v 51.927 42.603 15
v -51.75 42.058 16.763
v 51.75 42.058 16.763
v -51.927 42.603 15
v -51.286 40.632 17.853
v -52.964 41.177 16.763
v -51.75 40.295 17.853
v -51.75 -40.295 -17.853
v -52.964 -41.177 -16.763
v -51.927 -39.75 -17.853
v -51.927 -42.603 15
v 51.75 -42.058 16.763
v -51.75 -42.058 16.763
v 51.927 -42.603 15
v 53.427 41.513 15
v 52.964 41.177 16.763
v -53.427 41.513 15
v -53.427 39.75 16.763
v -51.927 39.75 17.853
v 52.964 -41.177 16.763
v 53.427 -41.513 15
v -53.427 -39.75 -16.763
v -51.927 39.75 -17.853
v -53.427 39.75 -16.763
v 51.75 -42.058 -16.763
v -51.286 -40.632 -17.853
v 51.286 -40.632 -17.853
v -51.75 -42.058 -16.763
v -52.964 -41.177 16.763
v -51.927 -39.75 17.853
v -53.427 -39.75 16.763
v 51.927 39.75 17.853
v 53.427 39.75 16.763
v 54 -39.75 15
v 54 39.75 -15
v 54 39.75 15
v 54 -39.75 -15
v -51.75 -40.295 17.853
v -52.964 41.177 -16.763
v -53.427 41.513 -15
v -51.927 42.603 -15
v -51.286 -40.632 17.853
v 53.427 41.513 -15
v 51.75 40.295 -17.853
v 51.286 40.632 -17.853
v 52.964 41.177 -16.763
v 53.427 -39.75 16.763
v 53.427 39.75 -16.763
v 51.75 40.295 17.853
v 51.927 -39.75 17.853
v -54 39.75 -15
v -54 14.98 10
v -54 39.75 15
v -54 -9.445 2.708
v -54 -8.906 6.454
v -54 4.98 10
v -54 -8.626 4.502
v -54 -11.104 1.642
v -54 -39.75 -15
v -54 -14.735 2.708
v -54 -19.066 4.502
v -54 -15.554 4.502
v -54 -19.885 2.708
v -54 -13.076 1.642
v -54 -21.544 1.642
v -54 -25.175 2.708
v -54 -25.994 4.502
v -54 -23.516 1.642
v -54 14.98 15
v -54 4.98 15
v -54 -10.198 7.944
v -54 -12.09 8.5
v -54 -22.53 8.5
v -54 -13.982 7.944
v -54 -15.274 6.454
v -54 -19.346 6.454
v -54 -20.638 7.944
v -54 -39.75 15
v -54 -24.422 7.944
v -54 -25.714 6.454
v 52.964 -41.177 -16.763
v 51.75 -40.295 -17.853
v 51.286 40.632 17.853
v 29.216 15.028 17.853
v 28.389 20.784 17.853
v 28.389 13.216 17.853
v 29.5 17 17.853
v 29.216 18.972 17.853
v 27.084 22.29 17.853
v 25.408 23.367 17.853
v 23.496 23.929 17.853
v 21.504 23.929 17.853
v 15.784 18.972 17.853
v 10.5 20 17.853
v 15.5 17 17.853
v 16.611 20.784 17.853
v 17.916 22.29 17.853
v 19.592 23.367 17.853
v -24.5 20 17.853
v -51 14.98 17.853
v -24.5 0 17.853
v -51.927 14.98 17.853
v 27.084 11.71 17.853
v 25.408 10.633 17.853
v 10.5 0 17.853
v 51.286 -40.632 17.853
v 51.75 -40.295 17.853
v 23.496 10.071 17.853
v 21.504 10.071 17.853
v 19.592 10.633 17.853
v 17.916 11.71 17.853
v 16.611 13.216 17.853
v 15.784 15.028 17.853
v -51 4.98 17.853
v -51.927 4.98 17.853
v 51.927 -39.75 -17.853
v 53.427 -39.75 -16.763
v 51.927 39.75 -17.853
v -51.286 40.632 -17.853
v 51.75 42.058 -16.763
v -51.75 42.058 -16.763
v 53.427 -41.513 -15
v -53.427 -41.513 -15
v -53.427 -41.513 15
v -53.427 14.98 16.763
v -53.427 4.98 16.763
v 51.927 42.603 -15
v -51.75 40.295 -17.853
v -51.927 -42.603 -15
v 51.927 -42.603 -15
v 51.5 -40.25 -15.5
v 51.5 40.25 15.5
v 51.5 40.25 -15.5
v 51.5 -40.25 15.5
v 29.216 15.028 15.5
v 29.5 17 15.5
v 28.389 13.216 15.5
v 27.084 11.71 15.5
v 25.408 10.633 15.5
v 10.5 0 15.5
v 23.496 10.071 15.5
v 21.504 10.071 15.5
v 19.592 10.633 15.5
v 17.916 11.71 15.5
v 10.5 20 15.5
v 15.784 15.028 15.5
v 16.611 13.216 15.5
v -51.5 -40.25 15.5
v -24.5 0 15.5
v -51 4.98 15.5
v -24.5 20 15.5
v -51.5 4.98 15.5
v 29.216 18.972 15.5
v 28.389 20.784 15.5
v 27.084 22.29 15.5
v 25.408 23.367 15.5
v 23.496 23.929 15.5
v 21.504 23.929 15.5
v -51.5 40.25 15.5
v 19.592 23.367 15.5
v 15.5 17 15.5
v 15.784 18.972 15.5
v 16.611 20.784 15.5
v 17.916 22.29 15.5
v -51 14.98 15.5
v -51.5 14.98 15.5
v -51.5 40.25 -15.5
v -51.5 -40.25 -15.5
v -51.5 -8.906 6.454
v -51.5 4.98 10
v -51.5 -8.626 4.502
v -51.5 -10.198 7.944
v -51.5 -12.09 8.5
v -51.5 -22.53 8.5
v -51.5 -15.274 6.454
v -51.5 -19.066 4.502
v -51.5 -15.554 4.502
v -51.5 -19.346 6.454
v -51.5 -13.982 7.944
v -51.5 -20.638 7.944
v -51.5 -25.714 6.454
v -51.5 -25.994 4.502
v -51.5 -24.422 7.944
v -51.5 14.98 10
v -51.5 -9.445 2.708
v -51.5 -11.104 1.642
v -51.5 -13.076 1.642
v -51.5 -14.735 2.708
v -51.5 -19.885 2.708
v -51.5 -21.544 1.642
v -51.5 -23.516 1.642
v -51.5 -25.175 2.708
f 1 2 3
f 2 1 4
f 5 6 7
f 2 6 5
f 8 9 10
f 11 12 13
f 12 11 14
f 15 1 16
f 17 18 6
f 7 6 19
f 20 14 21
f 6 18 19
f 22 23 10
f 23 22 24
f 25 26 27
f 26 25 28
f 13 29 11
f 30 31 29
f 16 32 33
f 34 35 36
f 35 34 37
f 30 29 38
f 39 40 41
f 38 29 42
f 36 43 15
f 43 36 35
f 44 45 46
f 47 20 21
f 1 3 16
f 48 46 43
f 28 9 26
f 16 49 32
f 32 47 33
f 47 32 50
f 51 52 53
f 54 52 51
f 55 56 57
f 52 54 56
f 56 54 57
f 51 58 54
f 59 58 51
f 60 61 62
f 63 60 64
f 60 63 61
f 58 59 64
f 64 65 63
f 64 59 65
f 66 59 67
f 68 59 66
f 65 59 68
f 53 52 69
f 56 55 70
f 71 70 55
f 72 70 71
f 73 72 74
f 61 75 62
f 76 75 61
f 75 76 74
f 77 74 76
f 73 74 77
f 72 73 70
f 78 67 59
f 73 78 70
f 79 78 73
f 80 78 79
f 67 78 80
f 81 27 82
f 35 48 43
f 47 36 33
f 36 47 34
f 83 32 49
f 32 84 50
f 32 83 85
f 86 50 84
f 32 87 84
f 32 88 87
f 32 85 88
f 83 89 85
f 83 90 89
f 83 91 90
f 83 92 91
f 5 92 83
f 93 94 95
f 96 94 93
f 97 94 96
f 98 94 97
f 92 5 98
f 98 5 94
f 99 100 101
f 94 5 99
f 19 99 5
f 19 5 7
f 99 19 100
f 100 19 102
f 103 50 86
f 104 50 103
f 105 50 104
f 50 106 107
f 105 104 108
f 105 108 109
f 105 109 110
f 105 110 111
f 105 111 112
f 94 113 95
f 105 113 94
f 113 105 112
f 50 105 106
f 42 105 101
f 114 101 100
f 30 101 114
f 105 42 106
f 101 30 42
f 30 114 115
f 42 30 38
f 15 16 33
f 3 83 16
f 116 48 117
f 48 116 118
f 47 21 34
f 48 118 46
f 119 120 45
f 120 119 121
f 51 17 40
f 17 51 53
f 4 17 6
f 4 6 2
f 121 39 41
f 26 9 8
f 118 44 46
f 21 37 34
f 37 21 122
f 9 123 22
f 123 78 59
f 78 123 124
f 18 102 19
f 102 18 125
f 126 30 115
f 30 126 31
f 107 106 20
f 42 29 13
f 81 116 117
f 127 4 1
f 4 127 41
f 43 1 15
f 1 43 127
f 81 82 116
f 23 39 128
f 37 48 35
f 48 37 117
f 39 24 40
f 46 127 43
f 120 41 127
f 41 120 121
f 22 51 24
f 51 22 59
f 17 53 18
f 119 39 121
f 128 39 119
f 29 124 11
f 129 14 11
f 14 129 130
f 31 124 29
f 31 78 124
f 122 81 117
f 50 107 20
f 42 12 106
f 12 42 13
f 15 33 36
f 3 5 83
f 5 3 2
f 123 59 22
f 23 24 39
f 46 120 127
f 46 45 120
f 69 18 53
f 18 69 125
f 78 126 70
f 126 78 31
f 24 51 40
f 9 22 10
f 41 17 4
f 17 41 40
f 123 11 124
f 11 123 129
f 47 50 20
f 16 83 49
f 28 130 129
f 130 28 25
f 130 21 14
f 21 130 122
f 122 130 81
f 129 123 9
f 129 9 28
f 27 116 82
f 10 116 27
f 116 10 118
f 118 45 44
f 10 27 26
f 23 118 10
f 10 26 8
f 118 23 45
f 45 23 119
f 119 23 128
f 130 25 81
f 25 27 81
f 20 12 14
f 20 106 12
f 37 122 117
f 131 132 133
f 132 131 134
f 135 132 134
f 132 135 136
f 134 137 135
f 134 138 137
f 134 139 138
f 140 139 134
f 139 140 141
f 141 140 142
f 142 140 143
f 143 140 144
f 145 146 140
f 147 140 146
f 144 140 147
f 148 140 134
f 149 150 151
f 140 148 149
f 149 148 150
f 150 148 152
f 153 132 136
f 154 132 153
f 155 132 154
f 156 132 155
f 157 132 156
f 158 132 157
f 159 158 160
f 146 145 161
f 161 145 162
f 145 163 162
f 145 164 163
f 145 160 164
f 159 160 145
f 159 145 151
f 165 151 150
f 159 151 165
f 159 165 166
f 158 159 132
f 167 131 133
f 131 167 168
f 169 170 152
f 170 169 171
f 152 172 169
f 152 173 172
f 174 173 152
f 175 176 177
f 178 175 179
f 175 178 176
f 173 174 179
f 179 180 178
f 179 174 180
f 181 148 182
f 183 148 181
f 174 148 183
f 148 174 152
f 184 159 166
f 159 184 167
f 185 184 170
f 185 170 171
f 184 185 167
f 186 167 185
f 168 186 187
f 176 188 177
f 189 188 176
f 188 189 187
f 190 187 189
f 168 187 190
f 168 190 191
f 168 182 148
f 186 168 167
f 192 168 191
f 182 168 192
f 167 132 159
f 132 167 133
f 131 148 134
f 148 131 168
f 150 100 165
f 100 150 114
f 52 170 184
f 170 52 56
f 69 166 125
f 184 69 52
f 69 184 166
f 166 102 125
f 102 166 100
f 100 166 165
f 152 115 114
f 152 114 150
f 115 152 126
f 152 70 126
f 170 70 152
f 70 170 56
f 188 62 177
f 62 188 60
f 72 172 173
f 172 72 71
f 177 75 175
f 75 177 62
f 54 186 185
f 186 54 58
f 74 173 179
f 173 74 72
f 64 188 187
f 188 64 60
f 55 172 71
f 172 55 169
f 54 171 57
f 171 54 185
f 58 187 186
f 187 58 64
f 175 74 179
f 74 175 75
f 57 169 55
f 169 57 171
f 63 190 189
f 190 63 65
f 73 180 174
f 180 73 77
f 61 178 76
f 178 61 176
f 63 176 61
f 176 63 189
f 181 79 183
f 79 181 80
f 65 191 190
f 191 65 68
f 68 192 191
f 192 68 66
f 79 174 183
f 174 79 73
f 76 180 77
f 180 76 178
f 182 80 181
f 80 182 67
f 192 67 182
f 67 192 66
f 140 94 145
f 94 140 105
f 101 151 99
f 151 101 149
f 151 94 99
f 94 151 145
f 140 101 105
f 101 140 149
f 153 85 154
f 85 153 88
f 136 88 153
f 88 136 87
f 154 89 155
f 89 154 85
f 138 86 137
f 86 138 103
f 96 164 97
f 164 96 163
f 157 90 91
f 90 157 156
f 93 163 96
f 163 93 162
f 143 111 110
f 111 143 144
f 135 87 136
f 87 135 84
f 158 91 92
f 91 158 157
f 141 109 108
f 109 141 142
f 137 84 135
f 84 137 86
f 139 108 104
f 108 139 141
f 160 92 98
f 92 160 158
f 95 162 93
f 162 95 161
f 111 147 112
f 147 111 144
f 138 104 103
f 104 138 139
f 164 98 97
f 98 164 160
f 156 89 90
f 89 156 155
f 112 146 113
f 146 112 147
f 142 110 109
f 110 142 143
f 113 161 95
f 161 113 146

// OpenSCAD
/* This module constructs the main body of the enclosure. First, we name the module: */

//pcb dimensions (mm)
pcb_l = 92; // (x dim, edges of PCB)
pcb_w = 69.5; // (y dim, edges of PCB)
pcb_h = 20; // (z dim, from bottom of PCB to top with placed components / headers / etc)

buffer = 10; // empty space in each dim
wall_thickness = 1; //

// box size overall
l = pcb_l+buffer; // x dim
w = pcb_w+buffer; // y dim
h = pcb_h+buffer; // z dim

wall=1; // wall thickness

//upper box height (pcb up)
h_up = 25;

//lower box height
h_down = 15;

// button 1
button1_radius = 3.5; //mm
button1_y = -12.09;
button1_z = 5;

// button 2
button2_radius = button1_radius;
button2_y = -22.53;
button2_z = button1_z;

// mic
mic_radius = 7;
mic_x = 22.5;
mic_y = 17;

// usb opening
usb_y = 9.98;
usb_dy = 10;
usb_z = 15;
usb_dz = 10;

//screen
screen_x = -7; //x position of center of screen
screen_y = 10; //y position of center of screen
screen_dx = 35; //length of screen (x dim)
screen_dy = 20; //

module enclosure() {

difference() {

minkowski()
{

difference()
{
translate([0,0,0])
cube([l,w,h], center=true);
};

sphere(h/10);
};

cube([l+wall_thickness,w+wall_thickness,h+wall_thickness], center=true);
}
}

module enclosureHoles() {

union() {

// USB
translate([-l/2-10,usb_y-usb_dy/2,usb_z-usb_dz/2])
cube([10*wall, usb_dy, usb_dz]);
    
    
// button #1
translate([-l/2,button1_y,button1_z])
rotate([0,-90,0])
cylinder(r=button1_radius, h=10*wall);

// button #2
translate([-l/2,button2_y,button2_z])
rotate([0,-90,0])
cylinder(r=button2_radius, h=10*wall);
    
// Screen
translate([screen_x-screen_dx/2,screen_y-screen_dy/2,h/2])
cube([screen_dx, screen_dy,10*wall]);


// mic
translate([mic_x,mic_y,h/2-10*wall/2])
cylinder(r=mic_radius, h=20*wall);

}
}

module concat() {

difference() {
enclosure();
enclosureHoles();
}
}

concat();

/* To actually print, we’ll need to render it in two separate halves which we will attach later. So, comment out the above concat() command and instead run the below code to render the top only */

difference() {
concat();
translate([0,0,-8.5])
cube([65,44,2], center=true);
}

/* then, comment the above out and run the following code to render the bottom only */

difference() {
concat();
translate([0,0,2])
cube([65,44,16], center=true);
}
